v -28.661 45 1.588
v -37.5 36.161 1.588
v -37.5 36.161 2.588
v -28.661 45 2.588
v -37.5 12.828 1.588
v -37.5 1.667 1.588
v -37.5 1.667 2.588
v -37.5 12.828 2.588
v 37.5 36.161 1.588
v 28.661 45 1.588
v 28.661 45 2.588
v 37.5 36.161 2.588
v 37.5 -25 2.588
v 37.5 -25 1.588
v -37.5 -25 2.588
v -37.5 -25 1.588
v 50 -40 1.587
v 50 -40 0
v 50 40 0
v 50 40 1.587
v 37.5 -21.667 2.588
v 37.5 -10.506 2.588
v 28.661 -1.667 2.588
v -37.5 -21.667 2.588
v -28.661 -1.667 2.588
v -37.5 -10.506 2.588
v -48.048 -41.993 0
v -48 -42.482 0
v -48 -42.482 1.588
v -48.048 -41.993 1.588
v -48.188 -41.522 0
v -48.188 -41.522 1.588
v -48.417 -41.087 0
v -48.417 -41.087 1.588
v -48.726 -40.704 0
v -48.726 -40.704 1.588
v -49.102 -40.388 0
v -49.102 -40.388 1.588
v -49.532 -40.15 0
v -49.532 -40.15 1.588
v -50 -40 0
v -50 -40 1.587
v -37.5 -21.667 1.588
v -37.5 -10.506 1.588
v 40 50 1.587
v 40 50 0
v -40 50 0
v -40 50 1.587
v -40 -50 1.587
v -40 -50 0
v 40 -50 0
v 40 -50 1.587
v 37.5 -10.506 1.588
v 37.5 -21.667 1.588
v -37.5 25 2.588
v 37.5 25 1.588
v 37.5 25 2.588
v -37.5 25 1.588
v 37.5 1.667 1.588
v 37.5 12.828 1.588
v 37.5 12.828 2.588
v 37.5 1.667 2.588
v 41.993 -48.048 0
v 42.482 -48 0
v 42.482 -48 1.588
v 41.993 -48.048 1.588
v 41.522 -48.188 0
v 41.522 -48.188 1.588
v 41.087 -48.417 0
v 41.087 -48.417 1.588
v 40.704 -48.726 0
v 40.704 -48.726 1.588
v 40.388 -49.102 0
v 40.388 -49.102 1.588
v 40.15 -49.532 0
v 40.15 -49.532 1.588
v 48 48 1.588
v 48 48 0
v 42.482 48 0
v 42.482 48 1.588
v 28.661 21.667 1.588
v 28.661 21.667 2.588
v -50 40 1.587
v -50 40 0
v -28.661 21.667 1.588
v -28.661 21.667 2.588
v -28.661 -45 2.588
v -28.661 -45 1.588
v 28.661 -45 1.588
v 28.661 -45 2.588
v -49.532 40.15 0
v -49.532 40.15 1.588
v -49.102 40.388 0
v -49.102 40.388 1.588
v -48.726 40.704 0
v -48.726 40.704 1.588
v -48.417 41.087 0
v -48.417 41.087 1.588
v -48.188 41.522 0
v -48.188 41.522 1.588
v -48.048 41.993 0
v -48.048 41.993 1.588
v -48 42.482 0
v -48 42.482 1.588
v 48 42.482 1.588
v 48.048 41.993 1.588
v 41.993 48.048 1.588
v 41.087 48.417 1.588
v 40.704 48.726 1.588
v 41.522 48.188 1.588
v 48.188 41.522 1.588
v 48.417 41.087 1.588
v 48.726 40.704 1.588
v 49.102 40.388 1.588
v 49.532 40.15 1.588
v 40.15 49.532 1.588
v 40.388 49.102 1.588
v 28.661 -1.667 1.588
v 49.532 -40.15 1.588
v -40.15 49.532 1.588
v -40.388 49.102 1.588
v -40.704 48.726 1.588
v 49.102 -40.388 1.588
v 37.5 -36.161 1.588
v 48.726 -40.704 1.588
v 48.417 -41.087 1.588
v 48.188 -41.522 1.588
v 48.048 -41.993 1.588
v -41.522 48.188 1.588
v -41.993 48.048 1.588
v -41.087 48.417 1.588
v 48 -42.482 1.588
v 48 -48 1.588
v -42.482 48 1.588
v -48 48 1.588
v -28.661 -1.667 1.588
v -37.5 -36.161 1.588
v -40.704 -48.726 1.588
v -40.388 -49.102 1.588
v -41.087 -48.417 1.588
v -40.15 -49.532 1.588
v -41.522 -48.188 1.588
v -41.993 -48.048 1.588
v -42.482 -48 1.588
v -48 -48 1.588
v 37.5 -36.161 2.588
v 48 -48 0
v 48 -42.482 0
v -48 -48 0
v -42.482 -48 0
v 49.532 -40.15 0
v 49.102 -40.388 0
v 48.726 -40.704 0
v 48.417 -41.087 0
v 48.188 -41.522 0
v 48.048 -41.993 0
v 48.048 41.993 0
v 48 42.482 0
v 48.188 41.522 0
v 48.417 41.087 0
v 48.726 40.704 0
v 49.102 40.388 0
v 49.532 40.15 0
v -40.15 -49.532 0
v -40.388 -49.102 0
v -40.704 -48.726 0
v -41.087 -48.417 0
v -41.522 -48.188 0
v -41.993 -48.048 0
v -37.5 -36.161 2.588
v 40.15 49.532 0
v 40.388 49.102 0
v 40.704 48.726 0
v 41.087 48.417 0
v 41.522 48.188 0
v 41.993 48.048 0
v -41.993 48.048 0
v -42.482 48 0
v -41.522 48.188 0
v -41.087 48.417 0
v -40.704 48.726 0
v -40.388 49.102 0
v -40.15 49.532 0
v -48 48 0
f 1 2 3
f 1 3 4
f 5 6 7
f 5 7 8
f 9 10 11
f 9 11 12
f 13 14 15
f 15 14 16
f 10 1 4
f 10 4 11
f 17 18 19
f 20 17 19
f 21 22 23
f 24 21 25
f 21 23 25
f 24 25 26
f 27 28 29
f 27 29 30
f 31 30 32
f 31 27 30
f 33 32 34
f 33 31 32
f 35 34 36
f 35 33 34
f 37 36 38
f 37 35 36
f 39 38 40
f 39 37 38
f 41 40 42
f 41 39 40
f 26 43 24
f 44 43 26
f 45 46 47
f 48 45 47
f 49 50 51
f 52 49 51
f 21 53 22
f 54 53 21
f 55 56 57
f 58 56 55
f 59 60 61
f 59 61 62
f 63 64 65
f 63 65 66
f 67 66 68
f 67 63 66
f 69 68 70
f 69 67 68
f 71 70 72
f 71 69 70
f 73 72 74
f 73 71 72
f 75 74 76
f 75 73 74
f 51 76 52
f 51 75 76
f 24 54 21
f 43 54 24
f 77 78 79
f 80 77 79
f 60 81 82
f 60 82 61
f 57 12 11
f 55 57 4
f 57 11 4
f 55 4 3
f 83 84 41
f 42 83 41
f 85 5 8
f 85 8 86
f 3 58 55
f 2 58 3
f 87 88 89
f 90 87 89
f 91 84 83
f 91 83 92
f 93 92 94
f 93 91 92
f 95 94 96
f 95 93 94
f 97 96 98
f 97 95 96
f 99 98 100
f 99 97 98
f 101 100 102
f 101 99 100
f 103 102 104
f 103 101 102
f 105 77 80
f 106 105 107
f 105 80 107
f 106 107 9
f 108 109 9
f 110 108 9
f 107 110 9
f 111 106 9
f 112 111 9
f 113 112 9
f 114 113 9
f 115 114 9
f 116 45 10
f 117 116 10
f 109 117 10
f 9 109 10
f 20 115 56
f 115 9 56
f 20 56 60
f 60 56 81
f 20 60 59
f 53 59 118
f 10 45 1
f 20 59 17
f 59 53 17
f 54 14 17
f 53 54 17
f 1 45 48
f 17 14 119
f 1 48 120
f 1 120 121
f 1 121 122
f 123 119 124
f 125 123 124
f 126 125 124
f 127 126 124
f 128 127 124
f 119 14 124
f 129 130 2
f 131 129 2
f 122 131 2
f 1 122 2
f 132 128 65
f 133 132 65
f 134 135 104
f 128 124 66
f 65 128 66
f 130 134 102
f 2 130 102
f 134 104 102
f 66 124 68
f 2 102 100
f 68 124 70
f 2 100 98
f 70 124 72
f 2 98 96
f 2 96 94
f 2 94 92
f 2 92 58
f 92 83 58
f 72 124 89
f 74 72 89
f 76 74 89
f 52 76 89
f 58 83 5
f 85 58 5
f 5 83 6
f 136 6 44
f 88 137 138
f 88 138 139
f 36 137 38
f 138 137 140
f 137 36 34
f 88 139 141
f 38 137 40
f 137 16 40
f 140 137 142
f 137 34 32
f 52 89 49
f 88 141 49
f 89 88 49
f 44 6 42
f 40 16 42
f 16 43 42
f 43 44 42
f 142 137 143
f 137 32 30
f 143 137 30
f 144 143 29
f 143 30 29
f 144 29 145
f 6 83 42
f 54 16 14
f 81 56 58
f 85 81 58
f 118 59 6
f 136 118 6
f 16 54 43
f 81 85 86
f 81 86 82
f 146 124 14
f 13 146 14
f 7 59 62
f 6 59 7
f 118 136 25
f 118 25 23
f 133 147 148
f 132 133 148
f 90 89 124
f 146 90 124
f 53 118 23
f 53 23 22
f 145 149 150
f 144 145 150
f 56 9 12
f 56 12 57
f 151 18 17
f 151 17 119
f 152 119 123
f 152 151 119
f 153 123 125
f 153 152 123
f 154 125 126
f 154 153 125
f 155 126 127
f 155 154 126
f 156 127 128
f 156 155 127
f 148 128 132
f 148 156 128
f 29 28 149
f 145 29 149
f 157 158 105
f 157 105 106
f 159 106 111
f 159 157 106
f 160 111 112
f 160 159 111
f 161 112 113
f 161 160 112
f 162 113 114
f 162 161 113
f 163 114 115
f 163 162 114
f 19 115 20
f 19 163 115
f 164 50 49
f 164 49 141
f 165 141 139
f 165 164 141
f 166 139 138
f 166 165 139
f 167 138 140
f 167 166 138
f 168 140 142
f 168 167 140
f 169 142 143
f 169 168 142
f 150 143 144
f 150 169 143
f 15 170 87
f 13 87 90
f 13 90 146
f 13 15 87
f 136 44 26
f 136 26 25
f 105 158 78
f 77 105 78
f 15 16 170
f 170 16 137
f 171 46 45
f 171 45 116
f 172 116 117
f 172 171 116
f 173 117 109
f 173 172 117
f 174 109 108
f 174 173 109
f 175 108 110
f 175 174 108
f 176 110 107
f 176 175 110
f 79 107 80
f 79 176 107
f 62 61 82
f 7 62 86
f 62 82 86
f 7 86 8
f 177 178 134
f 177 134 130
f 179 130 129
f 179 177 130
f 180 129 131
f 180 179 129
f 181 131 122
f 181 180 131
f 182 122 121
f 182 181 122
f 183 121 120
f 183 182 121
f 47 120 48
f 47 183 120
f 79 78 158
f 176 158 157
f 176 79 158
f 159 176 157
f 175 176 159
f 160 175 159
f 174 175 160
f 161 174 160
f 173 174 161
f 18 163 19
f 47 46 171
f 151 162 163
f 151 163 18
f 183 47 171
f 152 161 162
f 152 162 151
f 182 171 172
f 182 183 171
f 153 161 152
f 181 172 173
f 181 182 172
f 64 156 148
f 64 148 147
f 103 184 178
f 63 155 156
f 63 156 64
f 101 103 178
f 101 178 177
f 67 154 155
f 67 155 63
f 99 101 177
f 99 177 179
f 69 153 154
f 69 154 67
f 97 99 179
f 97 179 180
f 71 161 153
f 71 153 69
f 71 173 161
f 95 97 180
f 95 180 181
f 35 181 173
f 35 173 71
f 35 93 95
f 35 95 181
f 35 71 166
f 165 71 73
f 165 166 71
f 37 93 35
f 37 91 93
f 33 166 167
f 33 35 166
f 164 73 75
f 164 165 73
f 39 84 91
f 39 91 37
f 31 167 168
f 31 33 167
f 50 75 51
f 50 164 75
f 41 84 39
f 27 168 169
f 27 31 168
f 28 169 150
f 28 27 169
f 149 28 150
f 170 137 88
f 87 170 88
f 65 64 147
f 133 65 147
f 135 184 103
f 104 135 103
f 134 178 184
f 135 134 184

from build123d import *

# Parameters (mm, degrees)
BOSS_EXTRUDE1_DEPTH = 1.5875
BOSS_EXTRUDE2_DEPTH = 1
FILLET1_R           = 2.54


with BuildPart() as part:
    # Sketch1 → Boss-Extrude1 (new body)
    with BuildSketch(Plane.XY):
        Polygon((40, 50), (-40, 50), (-40, 48), (-48, 48), (-48, 40), (-50, 40), (-50, -37.864895224), (-50, -40), (-48, -40), (-48, -48), (-40, -48), (-40, -50), (-37.864895224, -50), (40, -50), (40, -48), (48, -48), (48, -40), (50, -40), (50, 40), (48, 40), (48, 48), (40, 48), align=None)
    extrude(amount=BOSS_EXTRUDE1_DEPTH)

    # Sketch2 → Boss-Extrude2 (add)
    with BuildSketch(Plane.XY.offset(1.5875)):
        Polygon((-28.661165235, 45), (28.661165235, 45), (37.5, 36.161165235), (37.5, 25), (-37.5, 25), (-37.5, 36.161165235), align=None)
        Polygon((-28.661165235, 21.666666667), (28.661165235, 21.666666667), (37.5, 12.827831902), (37.5, 1.666666667), (-37.5, 1.666666667), (-37.5, 12.827831902), align=None)
        Polygon((-28.661165235, -1.666666667), (28.661165235, -1.666666667), (37.5, -10.505501431), (37.5, -21.666666667), (-37.5, -21.666666667), (-37.5, -10.505501431), align=None)
        Polygon((-37.5, -36.161165235), (-28.661165235, -45), (28.661165235, -45), (37.5, -36.161165235), (37.5, -25), (-37.5, -25), align=None)
    extrude(amount=BOSS_EXTRUDE2_DEPTH)

    # Fillet1
    # the kernel refuses this fillet: 2.54 mm, written as the material it adds along each edge
    with BuildSketch(Plane(origin=(-48, -40, 0), x_dir=(-1.0, -3.6735059438767946e-12, 0), z_dir=(0, 0, 1)), Plane(origin=(40, -48, 0), x_dir=(3.808509063671012e-12, -1.0, 0), z_dir=(0, 0, 1)), Plane(origin=(48, 40, 0), x_dir=(1.0, 3.659295089161617e-12, 0), z_dir=(0, 0, 1)), Plane(origin=(-40, 48, 0), x_dir=(-3.7978509226345916e-12, 1.0, 0), z_dir=(0, 0, 1))) as fillet1_piece_1:
        with BuildLine():
            CenterArc((2.54, 2.481934729), FILLET1_R, 180, 77.725329785)
            Line((0, 2.481934729), (-0.0508, 2.481934729))
            Line((-0.0508, 2.481934729), (-0.0508, 0))
            Line((-0.0508, 0), (0, -0.0508))
            ThreePointArc((0, -0.0508), (1, -0.0508), (1.9892, -0.049638695))
            Line((1.9892, -0.049638695), (2, 0))
        make_face()
    extrude(amount=1.5875)
    with BuildSketch(Plane(origin=(-40, -48, 0), x_dir=(-1, 0, 0), z_dir=(0, 0, 1)), Plane(origin=(48, -40, 0), x_dir=(0, -1, 0), z_dir=(0, 0, 1)), Plane(origin=(-48, 40, 0), x_dir=(0, 1, 0), z_dir=(0, 0, 1))) as fillet1_piece_2:
        with BuildLine():
            CenterArc((2.481934729, 2.54), FILLET1_R, 192.274670215, 77.725329785)
            Line((0, 2), (-0.049638695, 1.9892))
            ThreePointArc((-0.049638695, 1.9892), (-0.0508, 1), (-0.0508, 0))
            Line((-0.0508, 0), (0, -0.0508))
            Line((0, -0.0508), (2.481934729, -0.0508))
            Line((2.481934729, -0.0508), (2.481934729, 0))
        make_face()
    extrude(amount=1.5875)
    with BuildSketch(Plane(origin=(40, 48, 0), x_dir=(3.726796649058746e-12, 1.0, 0), z_dir=(0, 0, 1))) as fillet1_piece_3:
        with BuildLine():
            CenterArc((2.54, -2.481934729), FILLET1_R, 102.274670215, 77.725329785)
            Line((0, -2.481934729), (-0.0508, -2.481934729))
            Line((-0.0508, -2.481934729), (-0.0508, 0))
            Line((-0.0508, 0), (0, 0.0508))
            ThreePointArc((0, 0.0508), (1, 0.0508), (1.9892, 0.049638695))
            Line((1.9892, 0.049638695), (2, 0))
        make_face()
    extrude(amount=1.5875)


solid = part.part
